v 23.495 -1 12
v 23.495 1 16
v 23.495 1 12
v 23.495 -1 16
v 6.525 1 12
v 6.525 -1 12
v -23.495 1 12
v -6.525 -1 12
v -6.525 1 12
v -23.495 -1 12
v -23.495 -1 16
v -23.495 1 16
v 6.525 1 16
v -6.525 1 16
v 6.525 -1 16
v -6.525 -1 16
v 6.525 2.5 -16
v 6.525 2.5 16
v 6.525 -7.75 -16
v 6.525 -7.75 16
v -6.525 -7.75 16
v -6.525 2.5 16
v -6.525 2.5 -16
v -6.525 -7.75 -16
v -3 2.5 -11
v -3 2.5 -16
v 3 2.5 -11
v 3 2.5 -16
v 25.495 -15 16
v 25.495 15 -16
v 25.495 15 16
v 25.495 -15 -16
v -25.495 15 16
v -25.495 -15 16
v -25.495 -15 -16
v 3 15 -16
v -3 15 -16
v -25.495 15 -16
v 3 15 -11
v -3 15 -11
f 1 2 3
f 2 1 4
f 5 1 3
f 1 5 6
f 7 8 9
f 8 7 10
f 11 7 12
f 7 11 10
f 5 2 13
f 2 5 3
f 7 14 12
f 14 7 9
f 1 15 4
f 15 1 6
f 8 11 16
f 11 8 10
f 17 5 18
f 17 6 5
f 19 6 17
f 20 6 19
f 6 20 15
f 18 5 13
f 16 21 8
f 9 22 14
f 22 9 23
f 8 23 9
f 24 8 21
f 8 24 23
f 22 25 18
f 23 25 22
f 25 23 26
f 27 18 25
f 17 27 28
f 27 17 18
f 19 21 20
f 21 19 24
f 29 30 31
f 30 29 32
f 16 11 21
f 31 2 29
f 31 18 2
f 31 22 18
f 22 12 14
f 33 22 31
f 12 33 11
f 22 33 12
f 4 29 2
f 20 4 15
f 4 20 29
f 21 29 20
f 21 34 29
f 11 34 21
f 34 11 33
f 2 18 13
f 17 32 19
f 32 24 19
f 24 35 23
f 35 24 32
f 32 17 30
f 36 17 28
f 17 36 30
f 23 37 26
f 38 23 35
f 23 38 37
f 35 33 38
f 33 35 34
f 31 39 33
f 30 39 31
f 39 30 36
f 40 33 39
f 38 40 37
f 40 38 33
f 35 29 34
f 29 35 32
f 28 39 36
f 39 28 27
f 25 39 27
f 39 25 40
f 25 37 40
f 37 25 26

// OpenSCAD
pcb_height = 58.420;
pcb_length = 45.720 + 1.27;
pcb_thickness = 1.6 + 0.4;

stand_width = pcb_length + 4;
stand_length = 30.0;
stand_height = 32.0;

usb_height = 2.80;
usb_width = 5.10 + 0.15; // Includes tolerance
usb_length = 7.90 + 0.15; // includes tolerance

usb_cutout_length = usb_length + 5;
usb_cutout_thickness = usb_width + 5;
usb_cutout_depth = stand_height + 5;

pcb_cutout_length = pcb_length;
pcb_cutout_thickness = pcb_thickness;
pcb_cutout_depth = 5.0;

cable_cutout_diameter = 5 + 1;

union() {
    stand();
}

module stand() {
    difference() {
        cube([stand_width,
              stand_length,
              stand_height],
             center = true);
        cutout();
        cable_cutout();
    }
}


module cutout() {
    pcb_cutout_x = -(pcb_cutout_length / 2);
    pcb_cutout_y = -(pcb_cutout_thickness / 2);
    pcb_cutout_z = (stand_height / 2) - pcb_cutout_depth + 1;

    usb_cutout_x = -(usb_cutout_length / 2);
    usb_cutout_y = -(usb_cutout_thickness - 2.5);
    usb_cutout_z = (stand_height / 2) - usb_cutout_depth + 1;

    union() {
        translate([pcb_cutout_x, pcb_cutout_y, pcb_cutout_z])
            cube([pcb_cutout_length,
                  pcb_cutout_thickness,
                  pcb_cutout_depth],
                 cunter = true);
        translate([usb_cutout_x, usb_cutout_y, usb_cutout_z])
            cube([usb_cutout_length,
                  usb_cutout_thickness,
                  usb_cutout_depth],
                 cunter = true);
    }
}

module cable_cutout() {
    cable_cutout_x = 0 - (cable_cutout_diameter / 2);
    cable_cutout_y = 0;
    cable_cutout_z = -(stand_height / 2) - 1;

    translate([cable_cutout_x, cable_cutout_y, cable_cutout_z])
        cube([cable_cutout_diameter,
              20,
              cable_cutout_diameter]);
}
